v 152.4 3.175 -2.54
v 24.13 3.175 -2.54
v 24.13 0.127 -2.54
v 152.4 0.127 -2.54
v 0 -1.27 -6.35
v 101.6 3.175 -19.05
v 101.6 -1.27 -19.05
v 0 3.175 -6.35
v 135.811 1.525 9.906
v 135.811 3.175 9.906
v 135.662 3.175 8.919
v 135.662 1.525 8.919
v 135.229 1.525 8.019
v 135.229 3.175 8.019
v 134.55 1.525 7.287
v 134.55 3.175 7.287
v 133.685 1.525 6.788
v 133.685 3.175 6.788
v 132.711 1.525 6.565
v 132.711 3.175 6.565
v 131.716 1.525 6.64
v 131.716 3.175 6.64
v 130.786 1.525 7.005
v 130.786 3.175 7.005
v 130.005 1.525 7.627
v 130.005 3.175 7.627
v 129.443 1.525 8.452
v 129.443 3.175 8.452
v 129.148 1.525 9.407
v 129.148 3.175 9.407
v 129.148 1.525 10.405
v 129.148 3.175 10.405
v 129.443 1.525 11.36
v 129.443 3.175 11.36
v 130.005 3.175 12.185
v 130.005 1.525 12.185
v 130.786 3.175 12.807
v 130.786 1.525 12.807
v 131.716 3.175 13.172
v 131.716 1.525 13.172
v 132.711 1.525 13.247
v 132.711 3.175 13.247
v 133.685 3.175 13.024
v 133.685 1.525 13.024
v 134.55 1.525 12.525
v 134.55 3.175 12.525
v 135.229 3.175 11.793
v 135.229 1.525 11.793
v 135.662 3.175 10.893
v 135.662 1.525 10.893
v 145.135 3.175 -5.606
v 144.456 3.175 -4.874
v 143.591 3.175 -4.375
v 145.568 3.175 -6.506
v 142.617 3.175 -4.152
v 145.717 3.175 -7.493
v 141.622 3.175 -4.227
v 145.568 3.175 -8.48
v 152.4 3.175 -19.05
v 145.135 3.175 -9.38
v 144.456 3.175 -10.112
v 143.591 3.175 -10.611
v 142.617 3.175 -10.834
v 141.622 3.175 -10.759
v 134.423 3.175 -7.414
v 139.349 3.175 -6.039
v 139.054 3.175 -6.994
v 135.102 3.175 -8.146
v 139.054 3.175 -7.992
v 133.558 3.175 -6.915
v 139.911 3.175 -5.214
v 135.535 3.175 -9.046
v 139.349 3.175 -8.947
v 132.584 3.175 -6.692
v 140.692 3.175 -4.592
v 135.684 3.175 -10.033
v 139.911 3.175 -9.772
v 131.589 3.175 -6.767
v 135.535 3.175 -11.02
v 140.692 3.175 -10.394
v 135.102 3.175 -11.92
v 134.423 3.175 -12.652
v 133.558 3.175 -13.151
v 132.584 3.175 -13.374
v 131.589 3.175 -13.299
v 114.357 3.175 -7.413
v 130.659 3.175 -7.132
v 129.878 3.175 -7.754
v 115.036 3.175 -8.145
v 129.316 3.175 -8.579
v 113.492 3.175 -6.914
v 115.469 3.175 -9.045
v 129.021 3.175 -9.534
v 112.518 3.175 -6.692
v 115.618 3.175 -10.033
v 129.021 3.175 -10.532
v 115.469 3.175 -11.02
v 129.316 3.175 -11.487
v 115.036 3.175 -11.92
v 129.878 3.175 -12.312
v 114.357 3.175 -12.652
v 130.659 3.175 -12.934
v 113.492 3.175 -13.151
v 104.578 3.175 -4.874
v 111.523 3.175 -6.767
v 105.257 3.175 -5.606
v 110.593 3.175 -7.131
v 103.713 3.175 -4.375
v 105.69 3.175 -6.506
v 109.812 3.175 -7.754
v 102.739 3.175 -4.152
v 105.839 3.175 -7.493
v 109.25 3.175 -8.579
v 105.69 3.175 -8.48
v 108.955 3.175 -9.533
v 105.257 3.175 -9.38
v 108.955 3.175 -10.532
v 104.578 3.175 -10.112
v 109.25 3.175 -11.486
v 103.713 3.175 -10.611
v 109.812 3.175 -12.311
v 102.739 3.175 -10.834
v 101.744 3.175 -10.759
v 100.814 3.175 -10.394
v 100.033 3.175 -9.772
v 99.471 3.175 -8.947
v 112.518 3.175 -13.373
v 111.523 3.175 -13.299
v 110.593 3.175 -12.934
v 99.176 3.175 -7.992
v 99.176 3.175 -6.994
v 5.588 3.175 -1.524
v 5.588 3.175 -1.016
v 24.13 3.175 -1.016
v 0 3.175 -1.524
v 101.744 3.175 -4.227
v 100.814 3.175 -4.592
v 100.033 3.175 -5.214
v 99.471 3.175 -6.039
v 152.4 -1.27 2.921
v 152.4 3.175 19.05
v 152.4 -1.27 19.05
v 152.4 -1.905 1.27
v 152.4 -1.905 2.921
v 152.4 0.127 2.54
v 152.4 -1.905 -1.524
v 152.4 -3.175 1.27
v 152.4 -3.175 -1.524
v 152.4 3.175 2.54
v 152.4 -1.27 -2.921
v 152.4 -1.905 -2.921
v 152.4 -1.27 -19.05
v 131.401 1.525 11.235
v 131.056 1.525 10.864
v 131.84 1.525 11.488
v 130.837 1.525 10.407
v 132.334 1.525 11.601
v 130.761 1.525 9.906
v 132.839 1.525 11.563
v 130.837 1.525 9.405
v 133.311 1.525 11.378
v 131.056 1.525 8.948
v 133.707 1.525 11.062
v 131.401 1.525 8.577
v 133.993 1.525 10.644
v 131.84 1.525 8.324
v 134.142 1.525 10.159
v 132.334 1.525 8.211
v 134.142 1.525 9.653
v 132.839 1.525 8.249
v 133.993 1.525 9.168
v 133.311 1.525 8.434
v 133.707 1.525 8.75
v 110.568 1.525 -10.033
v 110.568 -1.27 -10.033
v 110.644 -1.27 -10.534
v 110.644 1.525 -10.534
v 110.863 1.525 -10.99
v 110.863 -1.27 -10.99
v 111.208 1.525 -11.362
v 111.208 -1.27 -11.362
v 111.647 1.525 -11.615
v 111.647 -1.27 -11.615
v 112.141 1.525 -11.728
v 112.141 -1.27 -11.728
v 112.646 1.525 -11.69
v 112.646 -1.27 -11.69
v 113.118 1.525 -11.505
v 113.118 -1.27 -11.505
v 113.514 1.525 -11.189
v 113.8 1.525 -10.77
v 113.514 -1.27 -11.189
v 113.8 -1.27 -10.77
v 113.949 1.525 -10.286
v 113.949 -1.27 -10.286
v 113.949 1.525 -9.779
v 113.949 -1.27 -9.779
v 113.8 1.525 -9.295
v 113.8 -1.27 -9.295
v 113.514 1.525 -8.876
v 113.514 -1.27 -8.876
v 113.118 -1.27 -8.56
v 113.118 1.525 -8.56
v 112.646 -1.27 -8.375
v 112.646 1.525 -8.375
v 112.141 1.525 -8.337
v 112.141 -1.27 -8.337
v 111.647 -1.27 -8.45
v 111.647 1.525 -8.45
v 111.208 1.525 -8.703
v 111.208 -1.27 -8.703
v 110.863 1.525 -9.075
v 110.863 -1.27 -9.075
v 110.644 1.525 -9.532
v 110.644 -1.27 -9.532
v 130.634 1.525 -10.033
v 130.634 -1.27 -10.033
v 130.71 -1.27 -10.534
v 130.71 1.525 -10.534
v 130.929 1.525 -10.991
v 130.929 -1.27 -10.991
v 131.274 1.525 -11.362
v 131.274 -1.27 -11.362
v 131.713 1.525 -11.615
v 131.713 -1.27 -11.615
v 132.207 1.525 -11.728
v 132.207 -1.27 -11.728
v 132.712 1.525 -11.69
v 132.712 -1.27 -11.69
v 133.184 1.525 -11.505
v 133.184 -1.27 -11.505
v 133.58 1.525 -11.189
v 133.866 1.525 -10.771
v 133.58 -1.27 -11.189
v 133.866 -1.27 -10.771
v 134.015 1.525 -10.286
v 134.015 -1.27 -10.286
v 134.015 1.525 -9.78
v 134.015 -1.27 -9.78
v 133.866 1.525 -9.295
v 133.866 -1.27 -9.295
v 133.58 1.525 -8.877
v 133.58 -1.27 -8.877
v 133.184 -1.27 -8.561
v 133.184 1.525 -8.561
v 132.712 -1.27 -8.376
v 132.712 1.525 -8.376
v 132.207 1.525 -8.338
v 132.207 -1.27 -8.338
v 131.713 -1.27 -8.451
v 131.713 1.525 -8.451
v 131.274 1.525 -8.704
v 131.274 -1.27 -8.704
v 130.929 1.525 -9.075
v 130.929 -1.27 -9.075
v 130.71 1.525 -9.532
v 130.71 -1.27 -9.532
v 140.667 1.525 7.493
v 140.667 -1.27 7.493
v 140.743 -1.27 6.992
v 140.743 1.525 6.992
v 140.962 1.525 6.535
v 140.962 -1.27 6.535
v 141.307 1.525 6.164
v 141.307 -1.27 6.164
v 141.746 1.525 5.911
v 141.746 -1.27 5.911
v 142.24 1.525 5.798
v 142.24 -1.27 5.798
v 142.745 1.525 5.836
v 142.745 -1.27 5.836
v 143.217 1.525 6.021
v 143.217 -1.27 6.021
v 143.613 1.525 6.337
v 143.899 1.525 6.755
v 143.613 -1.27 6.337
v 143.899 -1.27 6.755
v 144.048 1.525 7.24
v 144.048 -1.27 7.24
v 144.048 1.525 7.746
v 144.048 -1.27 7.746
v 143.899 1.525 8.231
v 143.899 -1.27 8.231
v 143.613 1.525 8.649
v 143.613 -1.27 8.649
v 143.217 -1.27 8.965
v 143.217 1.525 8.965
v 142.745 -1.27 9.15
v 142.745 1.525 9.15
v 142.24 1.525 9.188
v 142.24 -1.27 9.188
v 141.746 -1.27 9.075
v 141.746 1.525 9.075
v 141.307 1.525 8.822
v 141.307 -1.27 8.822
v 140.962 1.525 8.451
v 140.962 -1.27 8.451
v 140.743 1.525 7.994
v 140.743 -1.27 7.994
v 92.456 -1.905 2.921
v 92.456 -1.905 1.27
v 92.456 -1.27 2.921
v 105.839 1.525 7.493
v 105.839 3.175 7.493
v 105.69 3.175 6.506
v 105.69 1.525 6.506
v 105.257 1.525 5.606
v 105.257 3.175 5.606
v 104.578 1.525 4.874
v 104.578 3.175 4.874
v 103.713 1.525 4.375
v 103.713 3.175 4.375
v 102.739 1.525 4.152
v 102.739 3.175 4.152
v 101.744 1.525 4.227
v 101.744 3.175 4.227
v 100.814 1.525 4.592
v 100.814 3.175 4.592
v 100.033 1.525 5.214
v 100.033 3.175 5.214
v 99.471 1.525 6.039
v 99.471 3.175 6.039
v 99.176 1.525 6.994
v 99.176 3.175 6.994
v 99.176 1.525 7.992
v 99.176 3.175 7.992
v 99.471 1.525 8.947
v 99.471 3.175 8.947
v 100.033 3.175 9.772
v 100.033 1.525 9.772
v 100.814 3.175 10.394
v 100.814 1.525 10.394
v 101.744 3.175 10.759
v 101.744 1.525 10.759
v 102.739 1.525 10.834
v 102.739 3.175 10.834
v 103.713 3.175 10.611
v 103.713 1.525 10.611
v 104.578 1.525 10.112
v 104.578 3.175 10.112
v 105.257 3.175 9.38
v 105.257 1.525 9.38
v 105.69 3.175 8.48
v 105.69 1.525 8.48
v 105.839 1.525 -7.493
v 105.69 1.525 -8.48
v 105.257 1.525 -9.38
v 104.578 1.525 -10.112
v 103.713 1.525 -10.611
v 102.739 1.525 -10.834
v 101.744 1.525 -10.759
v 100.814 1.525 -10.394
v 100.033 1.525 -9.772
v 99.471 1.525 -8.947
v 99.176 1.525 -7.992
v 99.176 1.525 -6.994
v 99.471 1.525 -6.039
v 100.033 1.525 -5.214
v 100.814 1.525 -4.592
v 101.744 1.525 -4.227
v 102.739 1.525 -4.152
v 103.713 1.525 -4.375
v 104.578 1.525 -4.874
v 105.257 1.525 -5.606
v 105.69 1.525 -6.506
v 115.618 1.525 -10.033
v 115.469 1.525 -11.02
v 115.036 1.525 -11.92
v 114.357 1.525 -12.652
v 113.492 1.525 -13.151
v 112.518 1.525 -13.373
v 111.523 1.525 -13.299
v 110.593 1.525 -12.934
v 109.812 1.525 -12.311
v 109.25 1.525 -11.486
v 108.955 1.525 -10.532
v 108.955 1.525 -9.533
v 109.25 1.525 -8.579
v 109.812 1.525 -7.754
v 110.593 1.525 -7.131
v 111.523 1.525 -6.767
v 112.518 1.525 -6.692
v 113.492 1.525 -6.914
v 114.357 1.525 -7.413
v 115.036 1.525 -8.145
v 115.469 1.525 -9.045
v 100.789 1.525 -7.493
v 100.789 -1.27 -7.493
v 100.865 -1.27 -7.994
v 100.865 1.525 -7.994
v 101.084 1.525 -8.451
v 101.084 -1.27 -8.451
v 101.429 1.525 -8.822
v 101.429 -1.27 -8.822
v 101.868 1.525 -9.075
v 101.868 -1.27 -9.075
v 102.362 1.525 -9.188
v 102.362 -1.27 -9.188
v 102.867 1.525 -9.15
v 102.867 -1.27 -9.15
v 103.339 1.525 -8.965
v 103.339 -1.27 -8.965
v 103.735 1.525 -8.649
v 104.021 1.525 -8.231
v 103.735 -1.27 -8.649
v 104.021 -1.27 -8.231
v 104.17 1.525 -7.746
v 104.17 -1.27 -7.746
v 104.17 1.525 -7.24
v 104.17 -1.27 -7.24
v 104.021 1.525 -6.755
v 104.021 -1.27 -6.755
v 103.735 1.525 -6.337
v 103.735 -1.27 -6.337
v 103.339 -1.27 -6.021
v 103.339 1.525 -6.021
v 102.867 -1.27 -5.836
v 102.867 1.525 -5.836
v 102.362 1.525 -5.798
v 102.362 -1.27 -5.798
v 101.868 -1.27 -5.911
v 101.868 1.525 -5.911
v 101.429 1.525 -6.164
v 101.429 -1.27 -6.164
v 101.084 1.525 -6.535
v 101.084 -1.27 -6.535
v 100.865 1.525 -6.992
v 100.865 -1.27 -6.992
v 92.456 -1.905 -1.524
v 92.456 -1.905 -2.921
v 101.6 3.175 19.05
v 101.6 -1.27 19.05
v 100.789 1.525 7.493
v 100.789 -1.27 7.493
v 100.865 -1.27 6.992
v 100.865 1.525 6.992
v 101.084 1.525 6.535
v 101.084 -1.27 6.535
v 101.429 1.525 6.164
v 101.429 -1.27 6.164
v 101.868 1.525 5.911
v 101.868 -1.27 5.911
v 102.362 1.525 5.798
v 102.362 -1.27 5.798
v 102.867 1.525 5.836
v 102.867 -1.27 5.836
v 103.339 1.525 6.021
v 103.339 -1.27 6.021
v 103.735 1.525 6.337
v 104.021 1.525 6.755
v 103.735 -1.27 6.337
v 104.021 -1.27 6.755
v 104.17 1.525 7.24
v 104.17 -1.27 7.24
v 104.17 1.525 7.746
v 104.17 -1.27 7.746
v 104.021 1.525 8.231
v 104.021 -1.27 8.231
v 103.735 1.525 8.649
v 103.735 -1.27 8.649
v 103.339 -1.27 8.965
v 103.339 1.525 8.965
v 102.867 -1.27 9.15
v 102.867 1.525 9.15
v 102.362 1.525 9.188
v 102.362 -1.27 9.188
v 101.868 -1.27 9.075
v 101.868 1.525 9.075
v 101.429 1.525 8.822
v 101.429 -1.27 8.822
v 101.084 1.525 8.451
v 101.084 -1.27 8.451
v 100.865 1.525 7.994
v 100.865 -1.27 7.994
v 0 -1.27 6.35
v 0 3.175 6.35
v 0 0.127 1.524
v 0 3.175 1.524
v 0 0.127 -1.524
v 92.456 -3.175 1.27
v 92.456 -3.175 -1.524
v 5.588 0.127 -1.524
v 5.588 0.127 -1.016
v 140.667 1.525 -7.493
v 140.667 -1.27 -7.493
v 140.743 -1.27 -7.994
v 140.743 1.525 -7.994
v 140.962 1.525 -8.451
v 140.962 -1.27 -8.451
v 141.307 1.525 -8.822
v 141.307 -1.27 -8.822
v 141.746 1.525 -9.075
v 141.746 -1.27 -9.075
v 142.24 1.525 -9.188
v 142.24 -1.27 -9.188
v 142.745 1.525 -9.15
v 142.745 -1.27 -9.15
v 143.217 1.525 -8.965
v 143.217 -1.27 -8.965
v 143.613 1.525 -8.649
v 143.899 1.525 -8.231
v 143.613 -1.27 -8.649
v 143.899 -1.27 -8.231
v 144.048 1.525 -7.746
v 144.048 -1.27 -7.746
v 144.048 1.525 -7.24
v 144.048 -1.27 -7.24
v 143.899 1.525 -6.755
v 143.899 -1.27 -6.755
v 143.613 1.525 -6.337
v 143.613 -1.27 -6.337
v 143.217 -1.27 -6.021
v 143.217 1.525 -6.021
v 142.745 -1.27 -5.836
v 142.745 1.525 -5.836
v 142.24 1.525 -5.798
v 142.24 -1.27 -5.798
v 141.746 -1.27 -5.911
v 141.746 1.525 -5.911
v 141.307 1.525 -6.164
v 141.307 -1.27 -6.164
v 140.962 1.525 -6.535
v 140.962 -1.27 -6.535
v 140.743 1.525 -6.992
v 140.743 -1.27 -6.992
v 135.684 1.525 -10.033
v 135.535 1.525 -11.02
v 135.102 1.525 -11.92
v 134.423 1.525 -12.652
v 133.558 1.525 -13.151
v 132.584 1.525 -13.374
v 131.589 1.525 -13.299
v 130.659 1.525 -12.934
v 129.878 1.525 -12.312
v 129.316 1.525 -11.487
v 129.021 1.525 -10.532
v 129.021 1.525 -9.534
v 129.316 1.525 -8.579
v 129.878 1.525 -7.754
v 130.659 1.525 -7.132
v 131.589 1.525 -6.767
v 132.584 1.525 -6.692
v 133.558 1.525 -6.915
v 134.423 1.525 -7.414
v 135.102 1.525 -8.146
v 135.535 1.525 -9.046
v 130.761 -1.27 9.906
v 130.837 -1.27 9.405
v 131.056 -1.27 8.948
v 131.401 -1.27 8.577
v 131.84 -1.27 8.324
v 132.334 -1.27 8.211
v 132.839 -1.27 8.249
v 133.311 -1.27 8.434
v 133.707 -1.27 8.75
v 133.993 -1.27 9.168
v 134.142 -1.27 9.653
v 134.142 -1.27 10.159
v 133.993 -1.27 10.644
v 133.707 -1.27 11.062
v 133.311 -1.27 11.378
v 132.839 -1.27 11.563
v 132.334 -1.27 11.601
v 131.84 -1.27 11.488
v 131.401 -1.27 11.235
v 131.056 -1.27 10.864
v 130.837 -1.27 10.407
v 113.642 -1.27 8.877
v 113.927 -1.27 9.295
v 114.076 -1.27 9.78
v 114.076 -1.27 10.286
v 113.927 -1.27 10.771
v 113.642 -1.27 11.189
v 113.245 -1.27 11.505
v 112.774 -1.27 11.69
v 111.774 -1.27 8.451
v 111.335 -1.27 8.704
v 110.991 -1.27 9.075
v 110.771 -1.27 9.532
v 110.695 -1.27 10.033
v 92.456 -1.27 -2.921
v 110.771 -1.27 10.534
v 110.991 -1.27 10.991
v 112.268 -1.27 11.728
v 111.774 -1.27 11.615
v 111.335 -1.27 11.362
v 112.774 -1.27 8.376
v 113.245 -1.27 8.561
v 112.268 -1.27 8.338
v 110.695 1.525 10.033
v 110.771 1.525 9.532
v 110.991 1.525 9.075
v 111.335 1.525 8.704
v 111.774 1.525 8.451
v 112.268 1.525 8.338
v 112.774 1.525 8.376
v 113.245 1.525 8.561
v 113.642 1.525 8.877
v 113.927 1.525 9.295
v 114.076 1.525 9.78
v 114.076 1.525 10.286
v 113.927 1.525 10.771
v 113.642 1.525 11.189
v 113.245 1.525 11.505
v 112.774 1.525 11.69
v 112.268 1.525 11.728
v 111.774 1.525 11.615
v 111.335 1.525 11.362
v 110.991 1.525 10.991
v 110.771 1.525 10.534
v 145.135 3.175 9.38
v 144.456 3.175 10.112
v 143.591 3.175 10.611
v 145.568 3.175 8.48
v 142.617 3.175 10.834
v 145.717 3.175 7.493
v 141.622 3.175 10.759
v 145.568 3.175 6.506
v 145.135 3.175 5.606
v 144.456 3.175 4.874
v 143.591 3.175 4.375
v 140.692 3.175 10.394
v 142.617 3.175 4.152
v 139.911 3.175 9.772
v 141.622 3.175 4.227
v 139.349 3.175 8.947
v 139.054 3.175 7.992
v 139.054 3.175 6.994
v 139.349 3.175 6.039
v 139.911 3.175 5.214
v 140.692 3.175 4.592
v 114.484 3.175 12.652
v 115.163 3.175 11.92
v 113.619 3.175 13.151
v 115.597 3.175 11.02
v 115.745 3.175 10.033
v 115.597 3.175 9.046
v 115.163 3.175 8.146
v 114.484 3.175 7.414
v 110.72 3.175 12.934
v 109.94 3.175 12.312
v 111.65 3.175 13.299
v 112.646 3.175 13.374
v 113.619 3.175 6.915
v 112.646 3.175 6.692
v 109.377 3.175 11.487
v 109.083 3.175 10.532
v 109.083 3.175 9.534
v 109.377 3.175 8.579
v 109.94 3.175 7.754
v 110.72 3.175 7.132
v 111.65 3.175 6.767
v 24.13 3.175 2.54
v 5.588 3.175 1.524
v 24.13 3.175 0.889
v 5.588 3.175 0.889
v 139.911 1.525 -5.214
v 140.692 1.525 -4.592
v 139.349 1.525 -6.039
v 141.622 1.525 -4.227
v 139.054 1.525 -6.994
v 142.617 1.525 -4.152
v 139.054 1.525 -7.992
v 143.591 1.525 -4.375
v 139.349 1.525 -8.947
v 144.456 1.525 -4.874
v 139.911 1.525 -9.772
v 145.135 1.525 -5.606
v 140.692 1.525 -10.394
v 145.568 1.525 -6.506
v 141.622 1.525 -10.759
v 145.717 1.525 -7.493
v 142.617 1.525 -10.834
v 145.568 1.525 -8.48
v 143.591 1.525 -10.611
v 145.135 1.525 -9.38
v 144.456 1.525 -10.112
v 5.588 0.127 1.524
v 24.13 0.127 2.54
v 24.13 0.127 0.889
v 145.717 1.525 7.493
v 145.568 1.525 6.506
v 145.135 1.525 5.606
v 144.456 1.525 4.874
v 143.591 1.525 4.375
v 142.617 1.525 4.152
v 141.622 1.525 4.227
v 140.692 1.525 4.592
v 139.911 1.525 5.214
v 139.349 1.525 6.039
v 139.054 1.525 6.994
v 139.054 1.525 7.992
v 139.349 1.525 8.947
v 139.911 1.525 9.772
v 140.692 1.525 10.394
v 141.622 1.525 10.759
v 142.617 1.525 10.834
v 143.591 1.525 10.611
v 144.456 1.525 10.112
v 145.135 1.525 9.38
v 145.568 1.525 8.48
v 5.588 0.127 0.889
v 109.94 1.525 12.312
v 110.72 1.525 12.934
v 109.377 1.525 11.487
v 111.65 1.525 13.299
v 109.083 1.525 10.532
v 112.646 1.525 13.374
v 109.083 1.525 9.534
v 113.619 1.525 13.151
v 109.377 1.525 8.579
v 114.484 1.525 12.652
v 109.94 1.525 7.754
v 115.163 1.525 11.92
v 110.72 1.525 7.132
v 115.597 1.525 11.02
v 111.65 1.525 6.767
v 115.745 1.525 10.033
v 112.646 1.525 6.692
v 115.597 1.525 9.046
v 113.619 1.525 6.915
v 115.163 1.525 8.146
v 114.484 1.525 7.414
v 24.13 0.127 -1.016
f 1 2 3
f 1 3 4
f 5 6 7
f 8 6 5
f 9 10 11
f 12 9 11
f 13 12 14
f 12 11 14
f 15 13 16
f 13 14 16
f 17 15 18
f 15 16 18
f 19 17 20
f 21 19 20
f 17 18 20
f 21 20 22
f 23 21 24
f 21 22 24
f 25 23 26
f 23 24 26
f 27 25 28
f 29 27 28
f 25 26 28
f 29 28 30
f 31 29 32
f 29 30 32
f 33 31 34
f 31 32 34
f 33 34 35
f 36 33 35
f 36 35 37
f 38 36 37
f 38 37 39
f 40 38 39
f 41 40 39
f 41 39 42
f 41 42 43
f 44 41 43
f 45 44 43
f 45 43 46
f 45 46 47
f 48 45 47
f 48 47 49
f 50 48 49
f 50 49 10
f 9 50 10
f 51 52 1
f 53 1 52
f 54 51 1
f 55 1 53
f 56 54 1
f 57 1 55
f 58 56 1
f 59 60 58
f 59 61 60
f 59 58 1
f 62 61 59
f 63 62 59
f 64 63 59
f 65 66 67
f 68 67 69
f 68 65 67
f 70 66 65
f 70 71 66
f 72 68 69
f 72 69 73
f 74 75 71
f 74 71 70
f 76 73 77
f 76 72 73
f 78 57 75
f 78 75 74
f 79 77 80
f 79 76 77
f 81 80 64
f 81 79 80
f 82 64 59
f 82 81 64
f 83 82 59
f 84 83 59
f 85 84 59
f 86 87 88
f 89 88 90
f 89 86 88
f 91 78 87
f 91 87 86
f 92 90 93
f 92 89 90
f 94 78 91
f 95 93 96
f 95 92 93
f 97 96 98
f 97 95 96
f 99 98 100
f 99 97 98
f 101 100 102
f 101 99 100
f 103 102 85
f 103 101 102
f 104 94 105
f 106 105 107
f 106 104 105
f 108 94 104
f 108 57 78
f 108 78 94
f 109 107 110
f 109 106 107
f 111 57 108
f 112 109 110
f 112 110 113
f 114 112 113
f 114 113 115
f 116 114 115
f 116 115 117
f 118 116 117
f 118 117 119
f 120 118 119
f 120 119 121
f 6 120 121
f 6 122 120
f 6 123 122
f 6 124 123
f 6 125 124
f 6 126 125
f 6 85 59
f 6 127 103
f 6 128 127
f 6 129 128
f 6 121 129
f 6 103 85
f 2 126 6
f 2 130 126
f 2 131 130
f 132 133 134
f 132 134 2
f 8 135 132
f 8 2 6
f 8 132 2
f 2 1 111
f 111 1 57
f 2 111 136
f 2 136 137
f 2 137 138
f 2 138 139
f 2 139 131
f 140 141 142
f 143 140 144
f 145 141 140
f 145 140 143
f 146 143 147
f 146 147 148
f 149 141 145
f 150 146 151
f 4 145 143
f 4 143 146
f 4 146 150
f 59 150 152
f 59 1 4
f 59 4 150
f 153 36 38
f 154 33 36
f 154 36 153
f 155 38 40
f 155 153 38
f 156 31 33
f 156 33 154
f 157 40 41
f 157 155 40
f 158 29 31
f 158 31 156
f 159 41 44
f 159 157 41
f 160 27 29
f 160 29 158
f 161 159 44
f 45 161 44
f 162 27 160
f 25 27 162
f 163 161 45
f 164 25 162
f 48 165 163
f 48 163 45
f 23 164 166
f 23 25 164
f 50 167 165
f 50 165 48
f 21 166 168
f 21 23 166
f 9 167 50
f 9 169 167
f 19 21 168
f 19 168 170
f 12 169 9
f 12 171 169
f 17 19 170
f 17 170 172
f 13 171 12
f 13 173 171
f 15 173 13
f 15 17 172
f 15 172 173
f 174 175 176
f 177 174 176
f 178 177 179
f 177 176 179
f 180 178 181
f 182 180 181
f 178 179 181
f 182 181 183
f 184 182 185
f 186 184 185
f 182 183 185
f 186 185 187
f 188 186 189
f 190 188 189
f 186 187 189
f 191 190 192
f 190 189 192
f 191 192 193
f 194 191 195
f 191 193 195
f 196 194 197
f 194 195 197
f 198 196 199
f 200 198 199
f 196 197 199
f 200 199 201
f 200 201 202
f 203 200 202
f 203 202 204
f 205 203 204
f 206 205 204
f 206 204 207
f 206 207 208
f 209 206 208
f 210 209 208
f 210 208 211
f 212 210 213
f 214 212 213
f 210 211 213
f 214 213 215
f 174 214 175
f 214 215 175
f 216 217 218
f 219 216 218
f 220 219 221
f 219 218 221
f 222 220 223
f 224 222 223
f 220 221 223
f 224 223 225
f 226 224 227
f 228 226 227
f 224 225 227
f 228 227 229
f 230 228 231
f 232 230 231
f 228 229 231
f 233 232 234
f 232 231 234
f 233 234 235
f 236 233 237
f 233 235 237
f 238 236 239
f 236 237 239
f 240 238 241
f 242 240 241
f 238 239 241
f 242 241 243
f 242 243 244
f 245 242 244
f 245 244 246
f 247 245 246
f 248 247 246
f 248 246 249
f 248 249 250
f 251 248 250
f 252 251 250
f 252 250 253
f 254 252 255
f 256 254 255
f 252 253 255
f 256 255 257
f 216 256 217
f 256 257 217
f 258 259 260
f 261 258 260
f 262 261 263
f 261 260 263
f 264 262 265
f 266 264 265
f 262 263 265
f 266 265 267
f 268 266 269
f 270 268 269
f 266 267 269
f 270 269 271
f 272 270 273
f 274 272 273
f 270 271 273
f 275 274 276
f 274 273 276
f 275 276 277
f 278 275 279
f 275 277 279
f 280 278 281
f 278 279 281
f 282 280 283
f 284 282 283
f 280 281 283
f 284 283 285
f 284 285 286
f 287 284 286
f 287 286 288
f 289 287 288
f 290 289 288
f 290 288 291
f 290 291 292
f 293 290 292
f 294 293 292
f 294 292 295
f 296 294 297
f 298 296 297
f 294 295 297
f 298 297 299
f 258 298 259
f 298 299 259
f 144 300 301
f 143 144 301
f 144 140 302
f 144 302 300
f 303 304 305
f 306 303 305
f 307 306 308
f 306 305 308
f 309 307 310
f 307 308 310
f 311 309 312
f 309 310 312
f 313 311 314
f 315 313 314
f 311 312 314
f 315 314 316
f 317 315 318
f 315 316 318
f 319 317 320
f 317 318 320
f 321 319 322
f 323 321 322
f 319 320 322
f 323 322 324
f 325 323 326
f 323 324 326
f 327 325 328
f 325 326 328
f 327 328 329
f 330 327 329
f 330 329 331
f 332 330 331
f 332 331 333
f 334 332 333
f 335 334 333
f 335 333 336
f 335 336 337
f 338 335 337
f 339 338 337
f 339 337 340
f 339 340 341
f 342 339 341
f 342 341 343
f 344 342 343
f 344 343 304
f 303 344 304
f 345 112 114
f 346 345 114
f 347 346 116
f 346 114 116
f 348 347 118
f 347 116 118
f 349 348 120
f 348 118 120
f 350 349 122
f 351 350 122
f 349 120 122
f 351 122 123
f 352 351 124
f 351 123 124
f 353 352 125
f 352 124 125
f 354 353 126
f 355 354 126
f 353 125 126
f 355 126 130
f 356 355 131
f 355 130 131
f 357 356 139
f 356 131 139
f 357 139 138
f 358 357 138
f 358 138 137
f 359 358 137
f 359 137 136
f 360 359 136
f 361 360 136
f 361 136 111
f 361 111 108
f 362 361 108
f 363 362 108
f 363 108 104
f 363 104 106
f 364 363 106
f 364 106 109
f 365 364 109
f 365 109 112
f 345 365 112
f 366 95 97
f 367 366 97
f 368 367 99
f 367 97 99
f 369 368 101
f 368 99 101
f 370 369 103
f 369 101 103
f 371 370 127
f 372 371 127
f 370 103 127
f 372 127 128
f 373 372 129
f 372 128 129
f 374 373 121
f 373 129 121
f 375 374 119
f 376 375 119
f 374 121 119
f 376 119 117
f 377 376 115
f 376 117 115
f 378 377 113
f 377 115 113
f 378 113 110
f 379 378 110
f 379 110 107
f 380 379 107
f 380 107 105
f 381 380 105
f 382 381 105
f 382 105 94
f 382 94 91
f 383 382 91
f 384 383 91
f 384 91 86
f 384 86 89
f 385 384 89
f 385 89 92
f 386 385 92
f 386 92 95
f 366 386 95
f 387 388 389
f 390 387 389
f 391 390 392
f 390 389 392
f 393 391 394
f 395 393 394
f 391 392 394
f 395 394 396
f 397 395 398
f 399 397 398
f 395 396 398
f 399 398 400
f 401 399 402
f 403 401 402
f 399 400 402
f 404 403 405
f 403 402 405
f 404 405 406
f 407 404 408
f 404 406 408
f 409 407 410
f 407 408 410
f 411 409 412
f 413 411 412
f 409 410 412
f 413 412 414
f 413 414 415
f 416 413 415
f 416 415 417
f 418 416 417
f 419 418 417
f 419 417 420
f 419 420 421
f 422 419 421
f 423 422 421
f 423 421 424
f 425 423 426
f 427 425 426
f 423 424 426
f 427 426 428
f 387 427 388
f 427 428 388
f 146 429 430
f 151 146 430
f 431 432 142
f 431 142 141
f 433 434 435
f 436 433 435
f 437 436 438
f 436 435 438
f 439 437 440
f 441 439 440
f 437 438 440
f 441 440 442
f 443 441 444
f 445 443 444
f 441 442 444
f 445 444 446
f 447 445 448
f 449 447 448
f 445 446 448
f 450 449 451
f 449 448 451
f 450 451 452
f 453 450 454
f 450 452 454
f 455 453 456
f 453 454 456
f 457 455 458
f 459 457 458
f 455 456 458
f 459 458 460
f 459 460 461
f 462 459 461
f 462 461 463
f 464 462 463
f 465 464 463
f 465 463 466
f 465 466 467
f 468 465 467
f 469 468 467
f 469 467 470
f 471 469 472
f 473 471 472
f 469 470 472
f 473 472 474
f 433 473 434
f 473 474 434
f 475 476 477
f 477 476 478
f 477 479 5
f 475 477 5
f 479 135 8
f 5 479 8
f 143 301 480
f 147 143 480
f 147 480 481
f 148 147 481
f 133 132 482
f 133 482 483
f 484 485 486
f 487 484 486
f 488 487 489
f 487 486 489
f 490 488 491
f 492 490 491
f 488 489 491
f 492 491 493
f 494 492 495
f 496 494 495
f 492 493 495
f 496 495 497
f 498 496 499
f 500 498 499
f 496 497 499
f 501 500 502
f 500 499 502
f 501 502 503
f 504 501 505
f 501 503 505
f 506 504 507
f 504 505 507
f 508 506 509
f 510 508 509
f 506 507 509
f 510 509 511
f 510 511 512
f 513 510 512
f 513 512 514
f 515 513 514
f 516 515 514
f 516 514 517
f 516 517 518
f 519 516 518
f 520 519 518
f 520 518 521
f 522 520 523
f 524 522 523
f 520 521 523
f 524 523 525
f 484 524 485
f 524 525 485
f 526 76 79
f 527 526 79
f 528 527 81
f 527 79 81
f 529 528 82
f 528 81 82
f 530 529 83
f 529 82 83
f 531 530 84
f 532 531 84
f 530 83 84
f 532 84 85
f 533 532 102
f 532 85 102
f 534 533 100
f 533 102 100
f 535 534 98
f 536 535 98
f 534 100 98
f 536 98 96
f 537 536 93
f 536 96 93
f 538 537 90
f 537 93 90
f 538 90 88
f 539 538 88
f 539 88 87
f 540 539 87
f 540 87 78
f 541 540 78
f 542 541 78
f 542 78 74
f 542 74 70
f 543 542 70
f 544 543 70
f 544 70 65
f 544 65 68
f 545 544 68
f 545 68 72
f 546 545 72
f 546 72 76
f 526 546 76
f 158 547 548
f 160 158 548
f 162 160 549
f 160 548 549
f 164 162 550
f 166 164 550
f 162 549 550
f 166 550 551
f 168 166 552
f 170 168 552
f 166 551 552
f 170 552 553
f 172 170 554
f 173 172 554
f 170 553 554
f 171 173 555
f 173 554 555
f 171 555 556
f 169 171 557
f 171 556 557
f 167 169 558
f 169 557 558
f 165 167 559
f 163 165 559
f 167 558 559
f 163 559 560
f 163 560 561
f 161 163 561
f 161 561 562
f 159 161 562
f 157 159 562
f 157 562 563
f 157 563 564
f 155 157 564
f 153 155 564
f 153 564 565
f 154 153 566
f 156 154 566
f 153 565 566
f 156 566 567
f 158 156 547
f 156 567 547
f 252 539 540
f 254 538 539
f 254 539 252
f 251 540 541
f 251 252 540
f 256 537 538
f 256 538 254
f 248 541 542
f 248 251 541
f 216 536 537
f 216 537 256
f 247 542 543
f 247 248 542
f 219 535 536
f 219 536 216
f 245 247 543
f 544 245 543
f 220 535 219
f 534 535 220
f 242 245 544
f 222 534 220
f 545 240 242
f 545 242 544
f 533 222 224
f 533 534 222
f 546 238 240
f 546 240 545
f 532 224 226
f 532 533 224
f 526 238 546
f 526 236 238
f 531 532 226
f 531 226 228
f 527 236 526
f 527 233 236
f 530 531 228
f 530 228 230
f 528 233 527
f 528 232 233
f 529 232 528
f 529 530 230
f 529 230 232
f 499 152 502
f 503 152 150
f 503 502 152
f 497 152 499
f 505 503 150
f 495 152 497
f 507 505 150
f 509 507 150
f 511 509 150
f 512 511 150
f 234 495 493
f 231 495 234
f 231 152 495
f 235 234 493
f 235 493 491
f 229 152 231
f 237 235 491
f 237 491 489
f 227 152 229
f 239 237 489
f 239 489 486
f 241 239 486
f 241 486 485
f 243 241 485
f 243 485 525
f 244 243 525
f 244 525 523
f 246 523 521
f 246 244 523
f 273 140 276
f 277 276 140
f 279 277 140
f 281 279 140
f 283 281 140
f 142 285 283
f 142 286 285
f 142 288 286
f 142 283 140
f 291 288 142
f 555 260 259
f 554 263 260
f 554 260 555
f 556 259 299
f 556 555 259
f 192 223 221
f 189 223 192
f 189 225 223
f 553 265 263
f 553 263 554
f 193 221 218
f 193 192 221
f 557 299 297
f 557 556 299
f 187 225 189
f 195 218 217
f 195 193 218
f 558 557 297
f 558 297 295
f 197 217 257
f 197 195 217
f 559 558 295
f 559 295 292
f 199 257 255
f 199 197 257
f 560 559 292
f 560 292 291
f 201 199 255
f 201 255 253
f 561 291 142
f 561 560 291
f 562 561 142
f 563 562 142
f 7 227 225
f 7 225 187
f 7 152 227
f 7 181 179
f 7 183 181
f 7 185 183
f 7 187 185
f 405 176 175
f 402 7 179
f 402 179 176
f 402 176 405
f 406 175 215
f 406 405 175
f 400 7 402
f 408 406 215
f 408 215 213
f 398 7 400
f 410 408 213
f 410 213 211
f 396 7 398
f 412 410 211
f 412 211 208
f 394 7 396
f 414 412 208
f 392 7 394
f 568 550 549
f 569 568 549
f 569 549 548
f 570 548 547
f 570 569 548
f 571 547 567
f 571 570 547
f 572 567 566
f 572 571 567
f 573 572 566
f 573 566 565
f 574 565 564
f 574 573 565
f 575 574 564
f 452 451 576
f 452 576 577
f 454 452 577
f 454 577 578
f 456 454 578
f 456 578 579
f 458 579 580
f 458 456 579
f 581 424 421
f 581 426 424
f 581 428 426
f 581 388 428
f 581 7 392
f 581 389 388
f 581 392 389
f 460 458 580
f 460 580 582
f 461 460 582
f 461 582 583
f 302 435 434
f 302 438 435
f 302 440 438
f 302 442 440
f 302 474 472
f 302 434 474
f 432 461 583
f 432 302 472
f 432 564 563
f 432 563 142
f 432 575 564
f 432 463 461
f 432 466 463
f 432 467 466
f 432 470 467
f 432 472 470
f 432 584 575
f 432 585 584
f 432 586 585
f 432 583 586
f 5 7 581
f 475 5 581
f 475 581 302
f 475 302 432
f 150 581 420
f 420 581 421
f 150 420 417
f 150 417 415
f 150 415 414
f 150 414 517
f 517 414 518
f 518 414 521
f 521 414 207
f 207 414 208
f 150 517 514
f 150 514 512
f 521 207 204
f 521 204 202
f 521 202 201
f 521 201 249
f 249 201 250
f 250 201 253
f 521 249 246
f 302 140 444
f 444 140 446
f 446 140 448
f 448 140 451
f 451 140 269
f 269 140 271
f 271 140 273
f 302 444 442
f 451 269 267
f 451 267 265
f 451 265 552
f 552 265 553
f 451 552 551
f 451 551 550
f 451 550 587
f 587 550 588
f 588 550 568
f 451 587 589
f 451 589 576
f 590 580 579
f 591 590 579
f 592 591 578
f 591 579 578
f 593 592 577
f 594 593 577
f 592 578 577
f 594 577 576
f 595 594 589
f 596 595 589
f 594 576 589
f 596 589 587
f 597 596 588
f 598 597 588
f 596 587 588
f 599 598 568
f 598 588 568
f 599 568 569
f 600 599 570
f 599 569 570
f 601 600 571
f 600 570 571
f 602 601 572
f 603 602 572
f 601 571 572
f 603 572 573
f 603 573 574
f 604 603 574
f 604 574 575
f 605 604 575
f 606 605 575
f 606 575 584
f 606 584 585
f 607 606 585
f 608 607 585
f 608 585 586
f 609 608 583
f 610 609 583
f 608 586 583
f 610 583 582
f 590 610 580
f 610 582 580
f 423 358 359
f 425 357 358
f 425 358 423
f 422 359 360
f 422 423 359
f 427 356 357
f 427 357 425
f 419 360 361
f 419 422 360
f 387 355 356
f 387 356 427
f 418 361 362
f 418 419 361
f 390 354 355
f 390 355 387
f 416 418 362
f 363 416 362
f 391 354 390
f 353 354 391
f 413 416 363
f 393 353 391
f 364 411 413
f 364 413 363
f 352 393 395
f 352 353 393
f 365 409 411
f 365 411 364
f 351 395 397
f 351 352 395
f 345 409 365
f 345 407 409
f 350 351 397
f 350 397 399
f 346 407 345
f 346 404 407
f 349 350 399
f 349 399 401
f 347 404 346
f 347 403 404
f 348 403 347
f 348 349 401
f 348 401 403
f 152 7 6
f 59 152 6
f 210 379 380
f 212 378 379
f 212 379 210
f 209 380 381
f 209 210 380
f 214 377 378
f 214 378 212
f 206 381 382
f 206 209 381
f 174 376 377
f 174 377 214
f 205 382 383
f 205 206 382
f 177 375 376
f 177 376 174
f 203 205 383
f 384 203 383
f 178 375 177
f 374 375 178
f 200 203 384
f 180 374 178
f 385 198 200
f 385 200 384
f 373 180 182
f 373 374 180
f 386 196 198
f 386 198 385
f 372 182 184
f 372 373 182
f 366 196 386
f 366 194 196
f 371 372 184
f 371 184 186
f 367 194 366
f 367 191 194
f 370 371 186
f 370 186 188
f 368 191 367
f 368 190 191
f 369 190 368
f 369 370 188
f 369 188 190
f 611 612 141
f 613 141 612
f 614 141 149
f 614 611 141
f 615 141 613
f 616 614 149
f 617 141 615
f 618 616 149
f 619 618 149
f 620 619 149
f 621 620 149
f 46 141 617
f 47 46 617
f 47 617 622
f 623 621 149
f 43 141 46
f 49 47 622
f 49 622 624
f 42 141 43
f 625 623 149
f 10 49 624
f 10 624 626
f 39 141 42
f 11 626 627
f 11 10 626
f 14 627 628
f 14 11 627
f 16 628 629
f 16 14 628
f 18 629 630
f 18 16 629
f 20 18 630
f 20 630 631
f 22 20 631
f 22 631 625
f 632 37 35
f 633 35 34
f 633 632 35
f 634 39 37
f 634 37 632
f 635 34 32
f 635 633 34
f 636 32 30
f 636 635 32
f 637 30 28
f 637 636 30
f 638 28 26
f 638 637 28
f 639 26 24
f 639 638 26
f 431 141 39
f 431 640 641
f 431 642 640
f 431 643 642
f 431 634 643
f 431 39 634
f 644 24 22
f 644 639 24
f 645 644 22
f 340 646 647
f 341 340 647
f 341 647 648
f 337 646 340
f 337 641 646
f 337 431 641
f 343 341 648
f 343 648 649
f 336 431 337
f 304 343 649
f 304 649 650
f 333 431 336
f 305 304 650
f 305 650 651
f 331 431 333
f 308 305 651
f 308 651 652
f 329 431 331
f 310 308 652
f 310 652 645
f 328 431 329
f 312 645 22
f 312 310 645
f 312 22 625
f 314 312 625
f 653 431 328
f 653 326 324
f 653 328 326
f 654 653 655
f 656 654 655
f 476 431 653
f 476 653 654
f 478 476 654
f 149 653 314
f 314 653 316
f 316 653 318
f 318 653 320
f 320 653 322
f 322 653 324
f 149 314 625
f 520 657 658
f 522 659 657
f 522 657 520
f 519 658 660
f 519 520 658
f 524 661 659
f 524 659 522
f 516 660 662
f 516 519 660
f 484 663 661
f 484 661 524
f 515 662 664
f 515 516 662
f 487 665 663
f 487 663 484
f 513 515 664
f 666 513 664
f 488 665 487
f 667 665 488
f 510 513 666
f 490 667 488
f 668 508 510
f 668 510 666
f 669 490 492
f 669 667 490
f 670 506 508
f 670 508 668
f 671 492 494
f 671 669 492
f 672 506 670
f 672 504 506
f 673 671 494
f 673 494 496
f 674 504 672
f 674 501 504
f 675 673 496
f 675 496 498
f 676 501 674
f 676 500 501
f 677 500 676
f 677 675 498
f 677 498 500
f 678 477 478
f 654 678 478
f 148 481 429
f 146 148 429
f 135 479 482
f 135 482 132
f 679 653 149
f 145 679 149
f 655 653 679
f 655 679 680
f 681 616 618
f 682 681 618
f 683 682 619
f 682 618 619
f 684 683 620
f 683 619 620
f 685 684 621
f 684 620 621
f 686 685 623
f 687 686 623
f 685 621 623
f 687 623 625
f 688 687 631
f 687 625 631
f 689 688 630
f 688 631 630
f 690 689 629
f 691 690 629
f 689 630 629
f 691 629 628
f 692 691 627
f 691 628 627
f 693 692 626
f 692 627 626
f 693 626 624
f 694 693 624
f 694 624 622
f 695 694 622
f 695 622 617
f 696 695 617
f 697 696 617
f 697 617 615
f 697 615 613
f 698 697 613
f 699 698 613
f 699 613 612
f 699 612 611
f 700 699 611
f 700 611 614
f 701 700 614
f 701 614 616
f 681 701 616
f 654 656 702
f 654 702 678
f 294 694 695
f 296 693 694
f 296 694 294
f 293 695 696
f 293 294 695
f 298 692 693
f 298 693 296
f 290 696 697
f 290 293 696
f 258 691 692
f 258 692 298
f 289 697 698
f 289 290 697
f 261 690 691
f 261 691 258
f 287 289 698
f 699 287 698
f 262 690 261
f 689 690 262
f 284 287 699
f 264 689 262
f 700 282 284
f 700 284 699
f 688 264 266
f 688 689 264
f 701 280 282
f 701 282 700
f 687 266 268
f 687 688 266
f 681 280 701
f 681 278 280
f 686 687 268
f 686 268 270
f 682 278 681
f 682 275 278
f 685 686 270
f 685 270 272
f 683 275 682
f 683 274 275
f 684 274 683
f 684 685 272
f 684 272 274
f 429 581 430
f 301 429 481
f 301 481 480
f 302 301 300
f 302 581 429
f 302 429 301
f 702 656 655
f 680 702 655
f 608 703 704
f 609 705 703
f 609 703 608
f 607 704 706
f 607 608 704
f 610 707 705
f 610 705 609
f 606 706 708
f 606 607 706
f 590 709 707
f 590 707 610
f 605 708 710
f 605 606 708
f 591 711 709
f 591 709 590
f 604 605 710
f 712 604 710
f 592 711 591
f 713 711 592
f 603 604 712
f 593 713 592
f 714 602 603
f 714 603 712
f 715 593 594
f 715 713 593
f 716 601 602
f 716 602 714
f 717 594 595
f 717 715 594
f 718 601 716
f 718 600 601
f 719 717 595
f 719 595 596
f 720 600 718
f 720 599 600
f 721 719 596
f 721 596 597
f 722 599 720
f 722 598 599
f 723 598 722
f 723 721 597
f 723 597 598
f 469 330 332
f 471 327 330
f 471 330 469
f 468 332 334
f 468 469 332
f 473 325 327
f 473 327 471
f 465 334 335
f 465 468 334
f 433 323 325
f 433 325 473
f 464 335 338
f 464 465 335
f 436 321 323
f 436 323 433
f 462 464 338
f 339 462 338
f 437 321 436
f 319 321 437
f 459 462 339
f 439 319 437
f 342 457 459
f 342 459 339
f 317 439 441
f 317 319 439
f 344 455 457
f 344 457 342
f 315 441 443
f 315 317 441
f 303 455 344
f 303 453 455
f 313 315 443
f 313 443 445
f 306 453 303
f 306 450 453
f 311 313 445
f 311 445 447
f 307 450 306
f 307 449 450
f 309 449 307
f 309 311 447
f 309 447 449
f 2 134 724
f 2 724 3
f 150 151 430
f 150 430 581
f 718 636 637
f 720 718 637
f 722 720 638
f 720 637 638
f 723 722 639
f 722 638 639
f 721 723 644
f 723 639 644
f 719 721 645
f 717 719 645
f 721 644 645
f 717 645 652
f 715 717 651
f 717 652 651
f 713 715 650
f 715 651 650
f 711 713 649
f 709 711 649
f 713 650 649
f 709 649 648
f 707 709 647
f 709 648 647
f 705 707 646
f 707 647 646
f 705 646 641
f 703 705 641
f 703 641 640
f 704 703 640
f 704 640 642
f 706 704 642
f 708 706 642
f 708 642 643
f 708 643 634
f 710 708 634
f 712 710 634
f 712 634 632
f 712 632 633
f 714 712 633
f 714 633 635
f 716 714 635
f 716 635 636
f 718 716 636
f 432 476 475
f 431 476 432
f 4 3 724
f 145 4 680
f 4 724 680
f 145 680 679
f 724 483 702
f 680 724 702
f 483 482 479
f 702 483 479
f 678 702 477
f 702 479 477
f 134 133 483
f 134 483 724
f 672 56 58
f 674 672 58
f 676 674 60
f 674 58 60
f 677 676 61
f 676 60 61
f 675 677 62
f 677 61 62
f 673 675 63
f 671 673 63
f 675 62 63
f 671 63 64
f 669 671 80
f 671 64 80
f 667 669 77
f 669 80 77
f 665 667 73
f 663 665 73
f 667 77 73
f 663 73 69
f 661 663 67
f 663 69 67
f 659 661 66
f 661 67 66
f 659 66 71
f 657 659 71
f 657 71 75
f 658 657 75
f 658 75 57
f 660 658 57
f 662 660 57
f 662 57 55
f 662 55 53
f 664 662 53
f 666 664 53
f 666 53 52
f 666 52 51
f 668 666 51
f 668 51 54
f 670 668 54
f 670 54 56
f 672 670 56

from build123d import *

# Parameters (mm, degrees)
SKETCH2_W                       = 38.1
SKETCH2_H                       = 6.35
BOSS_EXTRUDE1_DEPTH             = 152.4
CBORE_FOR_M3_SBHCS1_D           = 3.4
CBORE_FOR_M3_SBHCS1_CBORE_D     = 6.7
CBORE_FOR_M3_SBHCS1_CBORE_DEPTH = 1.65
SKETCH9_W                       = 3.048
SKETCH9_H                       = 3.048
CUT_EXTRUDE1_DEPTH              = 5.588
SKETCH12_W                      = 128.27
SKETCH12_H                      = 5.08
CUT_EXTRUDE2_DEPTH              = 3.048
SKETCH13_W                      = 18.542
SKETCH13_H                      = 1.905
CUT_EXTRUDE3_DEPTH              = 3.048
CUT_EXTRUDE4_DEPTH              = 6.35
CUT_EXTRUDE5_DEPTH              = 6.35
CUT_EXTRUDE7_DEPTH              = 154.618824123
CUT_EXTRUDE7_DEPTH_BACK         = 59.944
SKETCH19_W                      = 38.1
SKETCH19_H                      = 2.032
CUT_EXTRUDE9_DEPTH              = 92.456


with BuildPart() as part:
    # Sketch2 → Boss-Extrude1 (new body)
    with BuildSketch(Plane(origin=(0, 0, 0), x_dir=(0, 0, -1), z_dir=(1, 0, 0))):
        Rectangle(SKETCH2_W, SKETCH2_H)
    extrude(amount=BOSS_EXTRUDE1_DEPTH)

    # CBORE for M3 SBHCS1 (through all)
    with Locations(Plane(origin=(0, 3.175, 0), x_dir=(1, 0, 0), z_dir=(0, 1, 0))):
        with Locations((142.367, -7.493), (142.367, 7.493), (102.489, 7.493), (102.489, -7.493), (132.334, 10.033), (112.268, 10.032595549), (112.395401903, -10.033), (132.461, -9.906)):
            CounterBoreHole(CBORE_FOR_M3_SBHCS1_D / 2, CBORE_FOR_M3_SBHCS1_CBORE_D / 2, CBORE_FOR_M3_SBHCS1_CBORE_DEPTH)

    # Sketch9 → Cut-Extrude1 (cut)
    with BuildSketch(Plane.ZY):
        with Locations((0, 1.651)):
            Rectangle(SKETCH9_W, SKETCH9_H)
    extrude(amount=-CUT_EXTRUDE1_DEPTH, mode=Mode.SUBTRACT)

    # Sketch12 → Cut-Extrude2 (cut)
    with BuildSketch(Plane(origin=(0, 3.175, 0), x_dir=(1, 0, 0), z_dir=(0, 1, 0))):
        with Locations((88.265, 0)):
            Rectangle(SKETCH12_W, SKETCH12_H)
    extrude(amount=-CUT_EXTRUDE2_DEPTH, mode=Mode.SUBTRACT)

    # Sketch13 → Cut-Extrude3 (cut)
    with BuildSketch(Plane(origin=(0, 3.175, 0), x_dir=(1, 0, 0), z_dir=(0, 1, 0))):
        with Locations((14.859, 0.0635)):
            Rectangle(SKETCH13_W, SKETCH13_H)
    extrude(amount=-CUT_EXTRUDE3_DEPTH, mode=Mode.SUBTRACT)

    # Sketch14 → Cut-Extrude4 (cut)
    with BuildSketch(Plane(origin=(0, 3.175, 0), x_dir=(1, 0, 0), z_dir=(0, 1, 0))):
        Polygon((0, 6.35), (0, 19.05), (101.6, 19.05), align=None)
    extrude(amount=-CUT_EXTRUDE4_DEPTH, mode=Mode.SUBTRACT)

    # Sketch15 → Cut-Extrude5 (cut)
    with BuildSketch(Plane(origin=(0, 3.175, 0), x_dir=(1, 0, 0), z_dir=(0, 1, 0))):
        Polygon((0, -6.35), (101.6, -19.05), (0, -19.05), align=None)
    extrude(amount=-CUT_EXTRUDE5_DEPTH, mode=Mode.SUBTRACT)

    # Sketch17 → Cut-Extrude7 (cut, two sides: drawn at the far end of the back side and taken through both)
    with BuildSketch(Plane(origin=(152.4, 0, 0), x_dir=(0, 0, -1), z_dir=(1, 0, 0)).offset(-CUT_EXTRUDE7_DEPTH_BACK)):
        Polygon((-105.766830618, -1.27), (-19.05, -1.27), (-2.921, -1.27), (-2.921, -1.905), (-1.27, -1.905), (-1.27, -3.175), (1.524, -3.175), (1.524, -1.905), (2.921, -1.905), (2.921, -1.27), (19.05, -1.27), (105.766830618, -1.27), (105.766830618, -174.703661235), (-105.766830618, -174.703661235), align=None)
    extrude(amount=CUT_EXTRUDE7_DEPTH + CUT_EXTRUDE7_DEPTH_BACK, mode=Mode.SUBTRACT)

    # Sketch19 → Cut-Extrude9 (cut)
    with BuildSketch(Plane.ZY):
        with Locations((0, -2.286)):
            Rectangle(SKETCH19_W, SKETCH19_H)
    extrude(amount=-CUT_EXTRUDE9_DEPTH, mode=Mode.SUBTRACT)


solid = part.part
